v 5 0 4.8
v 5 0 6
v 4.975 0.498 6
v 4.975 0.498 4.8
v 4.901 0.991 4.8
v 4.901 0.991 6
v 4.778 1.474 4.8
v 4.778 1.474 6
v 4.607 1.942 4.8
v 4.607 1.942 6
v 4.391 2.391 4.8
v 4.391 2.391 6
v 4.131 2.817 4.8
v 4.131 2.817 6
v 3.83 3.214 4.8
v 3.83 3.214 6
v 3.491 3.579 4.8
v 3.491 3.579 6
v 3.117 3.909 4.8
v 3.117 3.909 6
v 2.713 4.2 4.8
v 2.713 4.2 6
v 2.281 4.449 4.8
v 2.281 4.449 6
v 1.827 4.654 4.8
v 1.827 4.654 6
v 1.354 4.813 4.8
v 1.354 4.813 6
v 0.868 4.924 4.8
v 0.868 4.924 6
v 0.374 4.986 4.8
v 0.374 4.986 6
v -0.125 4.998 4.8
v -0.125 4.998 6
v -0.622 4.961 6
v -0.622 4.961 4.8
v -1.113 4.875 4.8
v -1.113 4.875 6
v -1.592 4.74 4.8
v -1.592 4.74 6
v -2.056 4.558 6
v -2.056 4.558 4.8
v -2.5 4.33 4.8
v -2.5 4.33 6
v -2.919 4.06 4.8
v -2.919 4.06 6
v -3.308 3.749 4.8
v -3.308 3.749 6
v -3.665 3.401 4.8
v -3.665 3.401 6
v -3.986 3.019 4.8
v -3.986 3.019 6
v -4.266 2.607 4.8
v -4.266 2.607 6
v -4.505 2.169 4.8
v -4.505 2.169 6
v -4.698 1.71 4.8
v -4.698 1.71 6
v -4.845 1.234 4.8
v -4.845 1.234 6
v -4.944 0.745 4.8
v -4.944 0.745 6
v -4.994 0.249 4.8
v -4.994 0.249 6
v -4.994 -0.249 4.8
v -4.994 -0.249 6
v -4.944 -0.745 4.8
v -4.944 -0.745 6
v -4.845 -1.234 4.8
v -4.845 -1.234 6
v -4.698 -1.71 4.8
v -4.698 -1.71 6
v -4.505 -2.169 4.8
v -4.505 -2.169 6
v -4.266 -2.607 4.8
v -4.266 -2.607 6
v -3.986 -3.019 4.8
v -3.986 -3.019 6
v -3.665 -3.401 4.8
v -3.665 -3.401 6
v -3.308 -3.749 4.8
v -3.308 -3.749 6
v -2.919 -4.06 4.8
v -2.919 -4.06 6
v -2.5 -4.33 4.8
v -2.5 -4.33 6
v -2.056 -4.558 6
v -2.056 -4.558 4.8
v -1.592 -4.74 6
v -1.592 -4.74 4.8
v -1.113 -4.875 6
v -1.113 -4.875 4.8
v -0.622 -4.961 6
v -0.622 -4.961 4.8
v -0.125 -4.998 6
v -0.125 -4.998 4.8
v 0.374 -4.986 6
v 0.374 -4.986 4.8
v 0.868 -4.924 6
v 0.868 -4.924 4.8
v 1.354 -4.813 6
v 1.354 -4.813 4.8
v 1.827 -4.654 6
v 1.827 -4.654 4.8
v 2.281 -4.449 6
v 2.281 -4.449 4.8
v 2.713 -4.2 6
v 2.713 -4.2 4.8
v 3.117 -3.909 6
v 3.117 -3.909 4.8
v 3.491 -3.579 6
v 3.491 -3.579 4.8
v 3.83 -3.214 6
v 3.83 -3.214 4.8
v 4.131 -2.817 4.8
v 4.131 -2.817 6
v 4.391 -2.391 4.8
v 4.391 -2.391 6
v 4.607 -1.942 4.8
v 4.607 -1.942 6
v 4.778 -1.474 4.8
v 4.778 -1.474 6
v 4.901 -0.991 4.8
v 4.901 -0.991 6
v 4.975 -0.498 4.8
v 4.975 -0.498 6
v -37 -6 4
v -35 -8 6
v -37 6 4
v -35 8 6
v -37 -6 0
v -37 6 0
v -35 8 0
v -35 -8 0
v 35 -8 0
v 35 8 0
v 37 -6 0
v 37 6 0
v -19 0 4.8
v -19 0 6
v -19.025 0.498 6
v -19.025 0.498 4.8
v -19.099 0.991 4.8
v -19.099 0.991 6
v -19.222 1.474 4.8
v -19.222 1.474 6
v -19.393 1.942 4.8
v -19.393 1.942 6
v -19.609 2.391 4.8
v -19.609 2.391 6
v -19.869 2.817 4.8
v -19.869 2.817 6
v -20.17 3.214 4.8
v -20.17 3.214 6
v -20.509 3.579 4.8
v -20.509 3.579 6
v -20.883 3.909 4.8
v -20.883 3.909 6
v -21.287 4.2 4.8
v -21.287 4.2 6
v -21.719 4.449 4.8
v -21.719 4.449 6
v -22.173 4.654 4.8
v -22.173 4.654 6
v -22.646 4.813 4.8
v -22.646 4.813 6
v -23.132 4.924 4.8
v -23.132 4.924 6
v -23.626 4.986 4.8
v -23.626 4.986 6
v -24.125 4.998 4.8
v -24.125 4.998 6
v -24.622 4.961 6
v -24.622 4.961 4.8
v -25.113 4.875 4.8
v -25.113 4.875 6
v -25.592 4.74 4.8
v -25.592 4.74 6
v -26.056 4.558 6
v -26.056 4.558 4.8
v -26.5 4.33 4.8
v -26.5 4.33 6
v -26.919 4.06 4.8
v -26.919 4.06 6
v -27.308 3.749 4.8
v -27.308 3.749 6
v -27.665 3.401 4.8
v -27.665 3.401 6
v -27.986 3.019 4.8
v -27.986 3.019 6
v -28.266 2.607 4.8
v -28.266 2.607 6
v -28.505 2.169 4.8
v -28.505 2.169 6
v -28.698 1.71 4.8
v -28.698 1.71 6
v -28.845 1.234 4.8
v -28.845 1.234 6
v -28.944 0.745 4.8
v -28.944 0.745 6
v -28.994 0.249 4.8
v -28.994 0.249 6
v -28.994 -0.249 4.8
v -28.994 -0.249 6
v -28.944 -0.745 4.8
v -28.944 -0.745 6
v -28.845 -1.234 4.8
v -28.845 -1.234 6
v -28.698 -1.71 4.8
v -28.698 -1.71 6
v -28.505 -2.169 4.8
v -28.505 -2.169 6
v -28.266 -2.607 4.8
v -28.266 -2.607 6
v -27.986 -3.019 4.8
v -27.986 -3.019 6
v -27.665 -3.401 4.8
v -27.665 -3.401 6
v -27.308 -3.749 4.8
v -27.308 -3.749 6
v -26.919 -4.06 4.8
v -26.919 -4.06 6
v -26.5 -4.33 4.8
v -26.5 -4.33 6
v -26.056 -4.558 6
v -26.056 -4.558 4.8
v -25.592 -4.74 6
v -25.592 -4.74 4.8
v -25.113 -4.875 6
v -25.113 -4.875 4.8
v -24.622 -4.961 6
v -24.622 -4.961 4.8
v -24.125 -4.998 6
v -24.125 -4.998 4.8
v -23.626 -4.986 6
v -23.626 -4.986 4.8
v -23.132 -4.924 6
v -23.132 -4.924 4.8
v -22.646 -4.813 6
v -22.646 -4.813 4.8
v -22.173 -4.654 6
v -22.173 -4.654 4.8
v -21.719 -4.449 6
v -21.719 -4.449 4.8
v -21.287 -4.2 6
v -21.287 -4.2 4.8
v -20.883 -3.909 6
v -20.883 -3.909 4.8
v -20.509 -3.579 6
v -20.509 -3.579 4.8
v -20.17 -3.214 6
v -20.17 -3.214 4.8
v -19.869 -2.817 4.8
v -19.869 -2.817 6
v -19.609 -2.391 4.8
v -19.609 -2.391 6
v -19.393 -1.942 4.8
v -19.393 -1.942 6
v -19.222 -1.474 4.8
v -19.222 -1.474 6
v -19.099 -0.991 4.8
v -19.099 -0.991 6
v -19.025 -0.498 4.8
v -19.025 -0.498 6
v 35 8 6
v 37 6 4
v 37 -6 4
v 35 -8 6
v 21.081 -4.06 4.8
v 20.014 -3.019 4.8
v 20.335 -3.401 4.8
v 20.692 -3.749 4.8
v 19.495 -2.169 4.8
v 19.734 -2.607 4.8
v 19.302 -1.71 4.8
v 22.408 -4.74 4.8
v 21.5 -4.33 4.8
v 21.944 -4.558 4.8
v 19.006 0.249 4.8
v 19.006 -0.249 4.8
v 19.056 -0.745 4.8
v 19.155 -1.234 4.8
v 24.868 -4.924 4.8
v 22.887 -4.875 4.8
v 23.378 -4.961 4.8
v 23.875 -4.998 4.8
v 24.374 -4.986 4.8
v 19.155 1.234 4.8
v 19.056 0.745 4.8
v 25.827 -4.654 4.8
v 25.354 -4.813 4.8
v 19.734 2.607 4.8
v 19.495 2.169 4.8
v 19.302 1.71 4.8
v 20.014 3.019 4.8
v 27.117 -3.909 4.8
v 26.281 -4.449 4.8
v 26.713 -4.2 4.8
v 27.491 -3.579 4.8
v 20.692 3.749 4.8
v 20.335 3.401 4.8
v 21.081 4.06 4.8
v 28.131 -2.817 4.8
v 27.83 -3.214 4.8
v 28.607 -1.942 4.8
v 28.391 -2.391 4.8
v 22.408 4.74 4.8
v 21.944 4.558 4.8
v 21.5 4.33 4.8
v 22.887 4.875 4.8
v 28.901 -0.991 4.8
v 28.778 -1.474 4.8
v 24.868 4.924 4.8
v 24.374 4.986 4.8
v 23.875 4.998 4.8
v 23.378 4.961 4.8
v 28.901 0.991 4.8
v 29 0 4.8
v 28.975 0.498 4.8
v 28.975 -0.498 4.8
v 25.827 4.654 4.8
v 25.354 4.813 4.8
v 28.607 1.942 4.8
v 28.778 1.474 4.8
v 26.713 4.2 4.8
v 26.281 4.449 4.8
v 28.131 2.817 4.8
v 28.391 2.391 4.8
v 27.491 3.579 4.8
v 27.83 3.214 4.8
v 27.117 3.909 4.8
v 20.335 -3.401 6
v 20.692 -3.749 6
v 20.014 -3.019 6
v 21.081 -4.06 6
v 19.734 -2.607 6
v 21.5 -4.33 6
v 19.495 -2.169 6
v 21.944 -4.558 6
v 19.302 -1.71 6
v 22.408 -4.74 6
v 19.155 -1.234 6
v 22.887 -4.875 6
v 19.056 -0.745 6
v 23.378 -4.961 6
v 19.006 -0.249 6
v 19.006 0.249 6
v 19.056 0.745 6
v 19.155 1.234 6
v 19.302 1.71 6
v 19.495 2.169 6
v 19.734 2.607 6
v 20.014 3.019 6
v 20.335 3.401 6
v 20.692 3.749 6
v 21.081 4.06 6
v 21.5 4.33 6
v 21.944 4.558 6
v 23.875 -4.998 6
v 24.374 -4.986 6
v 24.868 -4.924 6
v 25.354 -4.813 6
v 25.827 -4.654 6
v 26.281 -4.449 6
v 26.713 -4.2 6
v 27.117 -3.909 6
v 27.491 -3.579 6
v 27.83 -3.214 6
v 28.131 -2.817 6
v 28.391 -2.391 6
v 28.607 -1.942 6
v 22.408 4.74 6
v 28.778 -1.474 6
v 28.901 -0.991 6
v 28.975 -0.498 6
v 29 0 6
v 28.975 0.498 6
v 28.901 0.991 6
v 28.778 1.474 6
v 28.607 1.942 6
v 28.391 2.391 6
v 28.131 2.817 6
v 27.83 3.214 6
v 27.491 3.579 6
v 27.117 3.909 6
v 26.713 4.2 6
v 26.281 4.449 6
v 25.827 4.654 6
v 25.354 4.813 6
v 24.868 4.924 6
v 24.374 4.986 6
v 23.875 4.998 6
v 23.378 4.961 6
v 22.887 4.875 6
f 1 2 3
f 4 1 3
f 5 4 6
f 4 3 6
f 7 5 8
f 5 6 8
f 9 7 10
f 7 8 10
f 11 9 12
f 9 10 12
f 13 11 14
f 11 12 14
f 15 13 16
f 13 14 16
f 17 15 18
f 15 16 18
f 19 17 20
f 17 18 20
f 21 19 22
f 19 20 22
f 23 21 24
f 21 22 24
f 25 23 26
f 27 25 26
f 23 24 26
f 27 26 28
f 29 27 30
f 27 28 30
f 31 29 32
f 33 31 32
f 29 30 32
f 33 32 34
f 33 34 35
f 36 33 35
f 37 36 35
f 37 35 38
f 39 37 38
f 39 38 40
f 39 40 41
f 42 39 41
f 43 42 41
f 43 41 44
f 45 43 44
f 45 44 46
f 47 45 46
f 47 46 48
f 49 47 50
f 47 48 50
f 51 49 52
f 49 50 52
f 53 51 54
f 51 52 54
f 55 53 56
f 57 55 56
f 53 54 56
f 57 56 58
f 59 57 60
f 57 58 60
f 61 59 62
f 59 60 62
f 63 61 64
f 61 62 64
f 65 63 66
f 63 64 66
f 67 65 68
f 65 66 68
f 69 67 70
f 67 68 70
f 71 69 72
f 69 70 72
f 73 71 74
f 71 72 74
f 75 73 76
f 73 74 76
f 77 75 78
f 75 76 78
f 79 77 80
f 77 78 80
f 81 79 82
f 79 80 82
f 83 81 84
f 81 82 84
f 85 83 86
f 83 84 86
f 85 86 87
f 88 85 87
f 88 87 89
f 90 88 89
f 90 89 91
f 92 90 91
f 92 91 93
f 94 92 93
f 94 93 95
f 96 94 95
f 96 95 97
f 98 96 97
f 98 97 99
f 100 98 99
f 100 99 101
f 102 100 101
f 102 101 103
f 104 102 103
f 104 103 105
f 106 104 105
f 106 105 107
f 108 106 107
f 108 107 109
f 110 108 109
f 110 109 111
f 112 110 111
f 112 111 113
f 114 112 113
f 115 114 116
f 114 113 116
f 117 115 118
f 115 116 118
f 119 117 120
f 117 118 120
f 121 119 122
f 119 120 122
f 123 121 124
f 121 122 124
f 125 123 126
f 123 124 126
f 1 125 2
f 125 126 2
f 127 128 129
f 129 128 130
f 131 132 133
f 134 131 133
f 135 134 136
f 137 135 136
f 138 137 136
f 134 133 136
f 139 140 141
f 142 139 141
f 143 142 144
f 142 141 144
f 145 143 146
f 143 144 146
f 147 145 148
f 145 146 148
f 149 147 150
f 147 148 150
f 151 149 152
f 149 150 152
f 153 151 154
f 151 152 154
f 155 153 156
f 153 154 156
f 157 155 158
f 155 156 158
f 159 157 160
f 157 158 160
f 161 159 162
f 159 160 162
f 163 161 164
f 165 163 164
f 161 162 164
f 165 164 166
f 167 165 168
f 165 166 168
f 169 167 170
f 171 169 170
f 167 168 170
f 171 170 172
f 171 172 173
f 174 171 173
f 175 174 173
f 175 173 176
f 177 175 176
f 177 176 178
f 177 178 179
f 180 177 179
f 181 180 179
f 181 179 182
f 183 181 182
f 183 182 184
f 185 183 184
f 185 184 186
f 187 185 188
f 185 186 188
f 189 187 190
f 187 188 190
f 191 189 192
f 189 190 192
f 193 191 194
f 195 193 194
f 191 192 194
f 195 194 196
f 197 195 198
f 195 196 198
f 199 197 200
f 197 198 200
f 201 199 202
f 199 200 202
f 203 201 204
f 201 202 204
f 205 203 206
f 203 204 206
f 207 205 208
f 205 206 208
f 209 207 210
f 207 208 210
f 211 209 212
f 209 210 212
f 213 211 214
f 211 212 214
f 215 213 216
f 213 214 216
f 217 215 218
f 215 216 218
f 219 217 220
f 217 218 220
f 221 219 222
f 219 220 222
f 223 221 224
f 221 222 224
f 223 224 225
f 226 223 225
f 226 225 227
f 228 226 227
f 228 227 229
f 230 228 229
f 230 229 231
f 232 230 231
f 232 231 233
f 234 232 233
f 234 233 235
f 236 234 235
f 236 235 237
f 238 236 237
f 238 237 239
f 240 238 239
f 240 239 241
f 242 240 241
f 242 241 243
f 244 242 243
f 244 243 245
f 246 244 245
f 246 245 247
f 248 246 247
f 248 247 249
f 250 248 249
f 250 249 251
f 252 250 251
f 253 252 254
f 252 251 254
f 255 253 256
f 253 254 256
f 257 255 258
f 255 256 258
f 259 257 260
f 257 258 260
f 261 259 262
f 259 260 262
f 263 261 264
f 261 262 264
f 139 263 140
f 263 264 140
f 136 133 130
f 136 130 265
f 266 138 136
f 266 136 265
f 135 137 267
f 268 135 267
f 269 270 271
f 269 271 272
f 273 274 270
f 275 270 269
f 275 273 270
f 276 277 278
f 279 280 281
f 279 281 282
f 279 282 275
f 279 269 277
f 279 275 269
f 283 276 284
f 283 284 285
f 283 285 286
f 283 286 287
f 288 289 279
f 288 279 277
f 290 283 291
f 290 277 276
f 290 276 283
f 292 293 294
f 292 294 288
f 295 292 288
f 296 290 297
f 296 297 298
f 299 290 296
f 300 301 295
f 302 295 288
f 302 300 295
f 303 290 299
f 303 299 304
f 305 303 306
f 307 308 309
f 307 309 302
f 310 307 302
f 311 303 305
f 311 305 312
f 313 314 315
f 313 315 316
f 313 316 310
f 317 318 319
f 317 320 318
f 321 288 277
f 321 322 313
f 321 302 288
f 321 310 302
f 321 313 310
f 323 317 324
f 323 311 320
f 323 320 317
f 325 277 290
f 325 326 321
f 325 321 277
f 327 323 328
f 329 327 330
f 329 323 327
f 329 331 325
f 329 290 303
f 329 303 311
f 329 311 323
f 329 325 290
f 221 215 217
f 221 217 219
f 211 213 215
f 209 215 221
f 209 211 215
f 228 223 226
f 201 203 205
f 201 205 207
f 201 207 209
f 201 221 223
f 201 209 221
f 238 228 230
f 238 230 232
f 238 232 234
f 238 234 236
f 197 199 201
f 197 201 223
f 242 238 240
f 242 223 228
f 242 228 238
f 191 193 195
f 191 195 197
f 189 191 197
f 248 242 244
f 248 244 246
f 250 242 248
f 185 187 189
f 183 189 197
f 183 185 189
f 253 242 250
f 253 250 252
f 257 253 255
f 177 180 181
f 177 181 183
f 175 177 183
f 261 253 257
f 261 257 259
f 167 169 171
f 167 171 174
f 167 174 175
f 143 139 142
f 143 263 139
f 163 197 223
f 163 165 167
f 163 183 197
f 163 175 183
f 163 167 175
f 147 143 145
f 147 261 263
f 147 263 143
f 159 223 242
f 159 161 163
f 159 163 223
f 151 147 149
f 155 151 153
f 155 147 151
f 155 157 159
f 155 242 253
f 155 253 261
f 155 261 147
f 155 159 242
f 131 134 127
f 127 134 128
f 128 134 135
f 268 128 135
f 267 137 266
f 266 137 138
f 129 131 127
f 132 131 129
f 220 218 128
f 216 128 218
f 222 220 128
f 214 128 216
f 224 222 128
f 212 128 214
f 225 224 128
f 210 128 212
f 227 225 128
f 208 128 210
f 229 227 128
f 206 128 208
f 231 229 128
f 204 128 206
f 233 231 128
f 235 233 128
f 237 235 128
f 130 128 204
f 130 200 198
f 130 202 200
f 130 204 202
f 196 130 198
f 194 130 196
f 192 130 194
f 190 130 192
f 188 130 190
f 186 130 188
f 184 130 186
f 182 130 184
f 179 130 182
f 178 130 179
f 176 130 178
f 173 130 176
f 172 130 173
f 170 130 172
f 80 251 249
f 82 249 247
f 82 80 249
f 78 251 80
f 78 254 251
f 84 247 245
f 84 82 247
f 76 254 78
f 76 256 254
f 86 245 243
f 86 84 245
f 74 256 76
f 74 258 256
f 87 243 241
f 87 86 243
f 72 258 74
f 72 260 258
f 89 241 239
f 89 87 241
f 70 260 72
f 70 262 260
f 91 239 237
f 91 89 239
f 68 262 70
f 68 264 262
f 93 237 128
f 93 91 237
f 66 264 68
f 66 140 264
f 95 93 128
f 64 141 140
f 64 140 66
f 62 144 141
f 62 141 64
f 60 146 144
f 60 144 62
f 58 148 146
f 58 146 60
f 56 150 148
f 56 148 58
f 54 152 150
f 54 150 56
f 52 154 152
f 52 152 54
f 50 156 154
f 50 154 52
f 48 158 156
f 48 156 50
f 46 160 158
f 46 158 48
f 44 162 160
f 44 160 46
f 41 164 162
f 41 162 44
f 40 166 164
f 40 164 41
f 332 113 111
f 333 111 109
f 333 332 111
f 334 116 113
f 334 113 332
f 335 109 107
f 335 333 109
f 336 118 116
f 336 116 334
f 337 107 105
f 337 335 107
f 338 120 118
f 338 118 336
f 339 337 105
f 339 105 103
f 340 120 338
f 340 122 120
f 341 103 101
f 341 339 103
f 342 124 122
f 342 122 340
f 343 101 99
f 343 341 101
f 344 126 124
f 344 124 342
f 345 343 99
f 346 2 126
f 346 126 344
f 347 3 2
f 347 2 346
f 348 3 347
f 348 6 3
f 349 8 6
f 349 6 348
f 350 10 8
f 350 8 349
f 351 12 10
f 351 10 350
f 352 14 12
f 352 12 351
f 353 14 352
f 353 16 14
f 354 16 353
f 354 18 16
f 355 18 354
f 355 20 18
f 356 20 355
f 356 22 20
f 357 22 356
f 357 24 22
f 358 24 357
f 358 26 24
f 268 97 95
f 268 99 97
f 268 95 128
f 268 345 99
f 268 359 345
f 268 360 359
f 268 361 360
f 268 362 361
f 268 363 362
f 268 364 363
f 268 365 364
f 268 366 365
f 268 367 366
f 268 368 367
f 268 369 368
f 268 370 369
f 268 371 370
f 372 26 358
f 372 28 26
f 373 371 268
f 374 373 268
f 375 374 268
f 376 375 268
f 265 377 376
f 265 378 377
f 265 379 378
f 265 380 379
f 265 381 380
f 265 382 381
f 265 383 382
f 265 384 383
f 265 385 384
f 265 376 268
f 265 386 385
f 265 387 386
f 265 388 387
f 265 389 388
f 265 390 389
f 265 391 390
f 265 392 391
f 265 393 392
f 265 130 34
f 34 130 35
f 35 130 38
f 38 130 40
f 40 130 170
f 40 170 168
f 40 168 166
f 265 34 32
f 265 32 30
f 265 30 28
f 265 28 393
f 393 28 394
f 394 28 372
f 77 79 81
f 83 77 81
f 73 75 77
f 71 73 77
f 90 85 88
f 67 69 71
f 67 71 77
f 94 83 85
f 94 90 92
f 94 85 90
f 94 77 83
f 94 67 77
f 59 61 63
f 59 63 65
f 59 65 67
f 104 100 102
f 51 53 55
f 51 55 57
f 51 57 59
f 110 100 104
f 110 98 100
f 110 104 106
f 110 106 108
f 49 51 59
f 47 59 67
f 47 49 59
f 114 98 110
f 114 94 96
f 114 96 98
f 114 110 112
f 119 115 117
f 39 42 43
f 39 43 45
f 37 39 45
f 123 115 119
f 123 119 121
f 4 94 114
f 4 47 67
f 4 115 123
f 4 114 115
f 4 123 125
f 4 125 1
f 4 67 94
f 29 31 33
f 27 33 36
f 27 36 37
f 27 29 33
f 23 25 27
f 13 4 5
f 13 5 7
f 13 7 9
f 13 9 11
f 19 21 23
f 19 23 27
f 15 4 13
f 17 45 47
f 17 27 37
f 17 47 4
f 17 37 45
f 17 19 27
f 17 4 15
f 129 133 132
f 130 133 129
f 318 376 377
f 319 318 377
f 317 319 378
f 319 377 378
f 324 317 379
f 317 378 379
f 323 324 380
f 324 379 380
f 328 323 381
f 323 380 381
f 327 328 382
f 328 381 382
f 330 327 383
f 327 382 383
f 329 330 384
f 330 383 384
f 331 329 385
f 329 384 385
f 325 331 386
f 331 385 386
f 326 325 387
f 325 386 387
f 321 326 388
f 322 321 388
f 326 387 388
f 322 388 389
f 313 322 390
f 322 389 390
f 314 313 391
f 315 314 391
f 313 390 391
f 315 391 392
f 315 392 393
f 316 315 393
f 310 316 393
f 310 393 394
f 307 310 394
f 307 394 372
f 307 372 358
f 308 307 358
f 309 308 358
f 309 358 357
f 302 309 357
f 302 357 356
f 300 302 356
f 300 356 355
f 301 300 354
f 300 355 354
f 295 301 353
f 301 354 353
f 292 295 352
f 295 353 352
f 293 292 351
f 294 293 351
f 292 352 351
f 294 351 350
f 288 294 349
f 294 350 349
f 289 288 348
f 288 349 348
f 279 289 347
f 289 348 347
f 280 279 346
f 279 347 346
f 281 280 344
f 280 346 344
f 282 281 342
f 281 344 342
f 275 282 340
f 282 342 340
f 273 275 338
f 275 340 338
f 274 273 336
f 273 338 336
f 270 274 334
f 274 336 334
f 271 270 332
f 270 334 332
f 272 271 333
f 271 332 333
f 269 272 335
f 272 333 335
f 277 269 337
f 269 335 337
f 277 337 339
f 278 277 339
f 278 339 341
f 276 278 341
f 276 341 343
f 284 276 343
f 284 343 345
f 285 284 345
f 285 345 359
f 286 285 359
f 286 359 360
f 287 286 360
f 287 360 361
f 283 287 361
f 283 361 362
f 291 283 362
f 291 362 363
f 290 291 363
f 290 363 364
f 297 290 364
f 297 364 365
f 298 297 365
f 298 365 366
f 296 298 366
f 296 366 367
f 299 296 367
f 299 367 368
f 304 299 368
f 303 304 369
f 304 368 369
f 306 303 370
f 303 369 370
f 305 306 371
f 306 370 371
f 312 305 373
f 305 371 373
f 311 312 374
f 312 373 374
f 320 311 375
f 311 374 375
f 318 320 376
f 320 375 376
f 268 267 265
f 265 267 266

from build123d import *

# Parameters (mm, degrees)
F0_W     = 74
F0_H     = 16
F1_DEPTH = 6
F2_R     = 5
F3_DEPTH = 1.2
F4_SIZE  = 2


# Not quite as in the source:
# - a feature of the source that left no trace in its solid (it failed there, or was rolled back) is left out


with BuildPart() as f1:
    # F0 (on Top) → F1 (new body)
    with BuildSketch(Plane.XY):
        Rectangle(F0_W, F0_H)
    extrude(amount=F1_DEPTH)

    # F2 (on face) → F3 (cut)
    with BuildSketch(Plane.XY.offset(6)):
        with Locations((-24, 0)):
            Circle(F2_R)
        Circle(F2_R)
        with Locations((24, 0)):
            Circle(F2_R)
    extrude(amount=-F3_DEPTH, mode=Mode.SUBTRACT)

    # F4
    f4_edges = [f1.edges().sort_by_distance(p)[0] for p in [
        (-37, 8, 3),
        (-37, -8, 3),
        (37, -8, 3),
        (37, 8, 3),
        (-37, 0, 6),
        (37, 0, 6),
    ]]
    chamfer(f4_edges, length=F4_SIZE)


solid = f1.part
